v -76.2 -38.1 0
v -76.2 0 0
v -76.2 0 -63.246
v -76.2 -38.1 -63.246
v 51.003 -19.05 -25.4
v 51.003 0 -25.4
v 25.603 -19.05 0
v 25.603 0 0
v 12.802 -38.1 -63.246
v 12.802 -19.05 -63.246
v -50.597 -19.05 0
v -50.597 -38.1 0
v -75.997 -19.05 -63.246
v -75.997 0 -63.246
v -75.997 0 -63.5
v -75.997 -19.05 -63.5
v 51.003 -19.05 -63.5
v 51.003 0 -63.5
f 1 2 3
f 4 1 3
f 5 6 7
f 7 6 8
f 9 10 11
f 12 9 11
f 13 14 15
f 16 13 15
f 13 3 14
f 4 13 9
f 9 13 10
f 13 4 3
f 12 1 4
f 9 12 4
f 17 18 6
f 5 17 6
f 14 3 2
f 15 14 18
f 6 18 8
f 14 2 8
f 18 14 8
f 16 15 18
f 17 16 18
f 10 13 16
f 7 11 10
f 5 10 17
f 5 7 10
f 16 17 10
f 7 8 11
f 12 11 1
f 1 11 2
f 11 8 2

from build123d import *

# Parameters (mm, degrees)
F1_DEPTH = 19.05
F3_DEPTH = 38.1


with BuildPart() as f1:
    # F0 (on Front) → F1 (new body)
    with BuildSketch(Plane.XZ):
        Polygon((25.603199, 0), (-75.996801, 0), (-75.996801, -63.5), (51.003199, -63.5), (51.003199, -25.4), align=None)
    extrude(amount=F1_DEPTH)

    # F2 (on Front) → F3 (join)
    with BuildSketch(Plane.XZ):
        Polygon((-50.5968, 0), (-76.200001, 0), (-76.200001, -63.246004), (12.8016, -63.246004), align=None)
    extrude(amount=F3_DEPTH)


solid = f1.part
